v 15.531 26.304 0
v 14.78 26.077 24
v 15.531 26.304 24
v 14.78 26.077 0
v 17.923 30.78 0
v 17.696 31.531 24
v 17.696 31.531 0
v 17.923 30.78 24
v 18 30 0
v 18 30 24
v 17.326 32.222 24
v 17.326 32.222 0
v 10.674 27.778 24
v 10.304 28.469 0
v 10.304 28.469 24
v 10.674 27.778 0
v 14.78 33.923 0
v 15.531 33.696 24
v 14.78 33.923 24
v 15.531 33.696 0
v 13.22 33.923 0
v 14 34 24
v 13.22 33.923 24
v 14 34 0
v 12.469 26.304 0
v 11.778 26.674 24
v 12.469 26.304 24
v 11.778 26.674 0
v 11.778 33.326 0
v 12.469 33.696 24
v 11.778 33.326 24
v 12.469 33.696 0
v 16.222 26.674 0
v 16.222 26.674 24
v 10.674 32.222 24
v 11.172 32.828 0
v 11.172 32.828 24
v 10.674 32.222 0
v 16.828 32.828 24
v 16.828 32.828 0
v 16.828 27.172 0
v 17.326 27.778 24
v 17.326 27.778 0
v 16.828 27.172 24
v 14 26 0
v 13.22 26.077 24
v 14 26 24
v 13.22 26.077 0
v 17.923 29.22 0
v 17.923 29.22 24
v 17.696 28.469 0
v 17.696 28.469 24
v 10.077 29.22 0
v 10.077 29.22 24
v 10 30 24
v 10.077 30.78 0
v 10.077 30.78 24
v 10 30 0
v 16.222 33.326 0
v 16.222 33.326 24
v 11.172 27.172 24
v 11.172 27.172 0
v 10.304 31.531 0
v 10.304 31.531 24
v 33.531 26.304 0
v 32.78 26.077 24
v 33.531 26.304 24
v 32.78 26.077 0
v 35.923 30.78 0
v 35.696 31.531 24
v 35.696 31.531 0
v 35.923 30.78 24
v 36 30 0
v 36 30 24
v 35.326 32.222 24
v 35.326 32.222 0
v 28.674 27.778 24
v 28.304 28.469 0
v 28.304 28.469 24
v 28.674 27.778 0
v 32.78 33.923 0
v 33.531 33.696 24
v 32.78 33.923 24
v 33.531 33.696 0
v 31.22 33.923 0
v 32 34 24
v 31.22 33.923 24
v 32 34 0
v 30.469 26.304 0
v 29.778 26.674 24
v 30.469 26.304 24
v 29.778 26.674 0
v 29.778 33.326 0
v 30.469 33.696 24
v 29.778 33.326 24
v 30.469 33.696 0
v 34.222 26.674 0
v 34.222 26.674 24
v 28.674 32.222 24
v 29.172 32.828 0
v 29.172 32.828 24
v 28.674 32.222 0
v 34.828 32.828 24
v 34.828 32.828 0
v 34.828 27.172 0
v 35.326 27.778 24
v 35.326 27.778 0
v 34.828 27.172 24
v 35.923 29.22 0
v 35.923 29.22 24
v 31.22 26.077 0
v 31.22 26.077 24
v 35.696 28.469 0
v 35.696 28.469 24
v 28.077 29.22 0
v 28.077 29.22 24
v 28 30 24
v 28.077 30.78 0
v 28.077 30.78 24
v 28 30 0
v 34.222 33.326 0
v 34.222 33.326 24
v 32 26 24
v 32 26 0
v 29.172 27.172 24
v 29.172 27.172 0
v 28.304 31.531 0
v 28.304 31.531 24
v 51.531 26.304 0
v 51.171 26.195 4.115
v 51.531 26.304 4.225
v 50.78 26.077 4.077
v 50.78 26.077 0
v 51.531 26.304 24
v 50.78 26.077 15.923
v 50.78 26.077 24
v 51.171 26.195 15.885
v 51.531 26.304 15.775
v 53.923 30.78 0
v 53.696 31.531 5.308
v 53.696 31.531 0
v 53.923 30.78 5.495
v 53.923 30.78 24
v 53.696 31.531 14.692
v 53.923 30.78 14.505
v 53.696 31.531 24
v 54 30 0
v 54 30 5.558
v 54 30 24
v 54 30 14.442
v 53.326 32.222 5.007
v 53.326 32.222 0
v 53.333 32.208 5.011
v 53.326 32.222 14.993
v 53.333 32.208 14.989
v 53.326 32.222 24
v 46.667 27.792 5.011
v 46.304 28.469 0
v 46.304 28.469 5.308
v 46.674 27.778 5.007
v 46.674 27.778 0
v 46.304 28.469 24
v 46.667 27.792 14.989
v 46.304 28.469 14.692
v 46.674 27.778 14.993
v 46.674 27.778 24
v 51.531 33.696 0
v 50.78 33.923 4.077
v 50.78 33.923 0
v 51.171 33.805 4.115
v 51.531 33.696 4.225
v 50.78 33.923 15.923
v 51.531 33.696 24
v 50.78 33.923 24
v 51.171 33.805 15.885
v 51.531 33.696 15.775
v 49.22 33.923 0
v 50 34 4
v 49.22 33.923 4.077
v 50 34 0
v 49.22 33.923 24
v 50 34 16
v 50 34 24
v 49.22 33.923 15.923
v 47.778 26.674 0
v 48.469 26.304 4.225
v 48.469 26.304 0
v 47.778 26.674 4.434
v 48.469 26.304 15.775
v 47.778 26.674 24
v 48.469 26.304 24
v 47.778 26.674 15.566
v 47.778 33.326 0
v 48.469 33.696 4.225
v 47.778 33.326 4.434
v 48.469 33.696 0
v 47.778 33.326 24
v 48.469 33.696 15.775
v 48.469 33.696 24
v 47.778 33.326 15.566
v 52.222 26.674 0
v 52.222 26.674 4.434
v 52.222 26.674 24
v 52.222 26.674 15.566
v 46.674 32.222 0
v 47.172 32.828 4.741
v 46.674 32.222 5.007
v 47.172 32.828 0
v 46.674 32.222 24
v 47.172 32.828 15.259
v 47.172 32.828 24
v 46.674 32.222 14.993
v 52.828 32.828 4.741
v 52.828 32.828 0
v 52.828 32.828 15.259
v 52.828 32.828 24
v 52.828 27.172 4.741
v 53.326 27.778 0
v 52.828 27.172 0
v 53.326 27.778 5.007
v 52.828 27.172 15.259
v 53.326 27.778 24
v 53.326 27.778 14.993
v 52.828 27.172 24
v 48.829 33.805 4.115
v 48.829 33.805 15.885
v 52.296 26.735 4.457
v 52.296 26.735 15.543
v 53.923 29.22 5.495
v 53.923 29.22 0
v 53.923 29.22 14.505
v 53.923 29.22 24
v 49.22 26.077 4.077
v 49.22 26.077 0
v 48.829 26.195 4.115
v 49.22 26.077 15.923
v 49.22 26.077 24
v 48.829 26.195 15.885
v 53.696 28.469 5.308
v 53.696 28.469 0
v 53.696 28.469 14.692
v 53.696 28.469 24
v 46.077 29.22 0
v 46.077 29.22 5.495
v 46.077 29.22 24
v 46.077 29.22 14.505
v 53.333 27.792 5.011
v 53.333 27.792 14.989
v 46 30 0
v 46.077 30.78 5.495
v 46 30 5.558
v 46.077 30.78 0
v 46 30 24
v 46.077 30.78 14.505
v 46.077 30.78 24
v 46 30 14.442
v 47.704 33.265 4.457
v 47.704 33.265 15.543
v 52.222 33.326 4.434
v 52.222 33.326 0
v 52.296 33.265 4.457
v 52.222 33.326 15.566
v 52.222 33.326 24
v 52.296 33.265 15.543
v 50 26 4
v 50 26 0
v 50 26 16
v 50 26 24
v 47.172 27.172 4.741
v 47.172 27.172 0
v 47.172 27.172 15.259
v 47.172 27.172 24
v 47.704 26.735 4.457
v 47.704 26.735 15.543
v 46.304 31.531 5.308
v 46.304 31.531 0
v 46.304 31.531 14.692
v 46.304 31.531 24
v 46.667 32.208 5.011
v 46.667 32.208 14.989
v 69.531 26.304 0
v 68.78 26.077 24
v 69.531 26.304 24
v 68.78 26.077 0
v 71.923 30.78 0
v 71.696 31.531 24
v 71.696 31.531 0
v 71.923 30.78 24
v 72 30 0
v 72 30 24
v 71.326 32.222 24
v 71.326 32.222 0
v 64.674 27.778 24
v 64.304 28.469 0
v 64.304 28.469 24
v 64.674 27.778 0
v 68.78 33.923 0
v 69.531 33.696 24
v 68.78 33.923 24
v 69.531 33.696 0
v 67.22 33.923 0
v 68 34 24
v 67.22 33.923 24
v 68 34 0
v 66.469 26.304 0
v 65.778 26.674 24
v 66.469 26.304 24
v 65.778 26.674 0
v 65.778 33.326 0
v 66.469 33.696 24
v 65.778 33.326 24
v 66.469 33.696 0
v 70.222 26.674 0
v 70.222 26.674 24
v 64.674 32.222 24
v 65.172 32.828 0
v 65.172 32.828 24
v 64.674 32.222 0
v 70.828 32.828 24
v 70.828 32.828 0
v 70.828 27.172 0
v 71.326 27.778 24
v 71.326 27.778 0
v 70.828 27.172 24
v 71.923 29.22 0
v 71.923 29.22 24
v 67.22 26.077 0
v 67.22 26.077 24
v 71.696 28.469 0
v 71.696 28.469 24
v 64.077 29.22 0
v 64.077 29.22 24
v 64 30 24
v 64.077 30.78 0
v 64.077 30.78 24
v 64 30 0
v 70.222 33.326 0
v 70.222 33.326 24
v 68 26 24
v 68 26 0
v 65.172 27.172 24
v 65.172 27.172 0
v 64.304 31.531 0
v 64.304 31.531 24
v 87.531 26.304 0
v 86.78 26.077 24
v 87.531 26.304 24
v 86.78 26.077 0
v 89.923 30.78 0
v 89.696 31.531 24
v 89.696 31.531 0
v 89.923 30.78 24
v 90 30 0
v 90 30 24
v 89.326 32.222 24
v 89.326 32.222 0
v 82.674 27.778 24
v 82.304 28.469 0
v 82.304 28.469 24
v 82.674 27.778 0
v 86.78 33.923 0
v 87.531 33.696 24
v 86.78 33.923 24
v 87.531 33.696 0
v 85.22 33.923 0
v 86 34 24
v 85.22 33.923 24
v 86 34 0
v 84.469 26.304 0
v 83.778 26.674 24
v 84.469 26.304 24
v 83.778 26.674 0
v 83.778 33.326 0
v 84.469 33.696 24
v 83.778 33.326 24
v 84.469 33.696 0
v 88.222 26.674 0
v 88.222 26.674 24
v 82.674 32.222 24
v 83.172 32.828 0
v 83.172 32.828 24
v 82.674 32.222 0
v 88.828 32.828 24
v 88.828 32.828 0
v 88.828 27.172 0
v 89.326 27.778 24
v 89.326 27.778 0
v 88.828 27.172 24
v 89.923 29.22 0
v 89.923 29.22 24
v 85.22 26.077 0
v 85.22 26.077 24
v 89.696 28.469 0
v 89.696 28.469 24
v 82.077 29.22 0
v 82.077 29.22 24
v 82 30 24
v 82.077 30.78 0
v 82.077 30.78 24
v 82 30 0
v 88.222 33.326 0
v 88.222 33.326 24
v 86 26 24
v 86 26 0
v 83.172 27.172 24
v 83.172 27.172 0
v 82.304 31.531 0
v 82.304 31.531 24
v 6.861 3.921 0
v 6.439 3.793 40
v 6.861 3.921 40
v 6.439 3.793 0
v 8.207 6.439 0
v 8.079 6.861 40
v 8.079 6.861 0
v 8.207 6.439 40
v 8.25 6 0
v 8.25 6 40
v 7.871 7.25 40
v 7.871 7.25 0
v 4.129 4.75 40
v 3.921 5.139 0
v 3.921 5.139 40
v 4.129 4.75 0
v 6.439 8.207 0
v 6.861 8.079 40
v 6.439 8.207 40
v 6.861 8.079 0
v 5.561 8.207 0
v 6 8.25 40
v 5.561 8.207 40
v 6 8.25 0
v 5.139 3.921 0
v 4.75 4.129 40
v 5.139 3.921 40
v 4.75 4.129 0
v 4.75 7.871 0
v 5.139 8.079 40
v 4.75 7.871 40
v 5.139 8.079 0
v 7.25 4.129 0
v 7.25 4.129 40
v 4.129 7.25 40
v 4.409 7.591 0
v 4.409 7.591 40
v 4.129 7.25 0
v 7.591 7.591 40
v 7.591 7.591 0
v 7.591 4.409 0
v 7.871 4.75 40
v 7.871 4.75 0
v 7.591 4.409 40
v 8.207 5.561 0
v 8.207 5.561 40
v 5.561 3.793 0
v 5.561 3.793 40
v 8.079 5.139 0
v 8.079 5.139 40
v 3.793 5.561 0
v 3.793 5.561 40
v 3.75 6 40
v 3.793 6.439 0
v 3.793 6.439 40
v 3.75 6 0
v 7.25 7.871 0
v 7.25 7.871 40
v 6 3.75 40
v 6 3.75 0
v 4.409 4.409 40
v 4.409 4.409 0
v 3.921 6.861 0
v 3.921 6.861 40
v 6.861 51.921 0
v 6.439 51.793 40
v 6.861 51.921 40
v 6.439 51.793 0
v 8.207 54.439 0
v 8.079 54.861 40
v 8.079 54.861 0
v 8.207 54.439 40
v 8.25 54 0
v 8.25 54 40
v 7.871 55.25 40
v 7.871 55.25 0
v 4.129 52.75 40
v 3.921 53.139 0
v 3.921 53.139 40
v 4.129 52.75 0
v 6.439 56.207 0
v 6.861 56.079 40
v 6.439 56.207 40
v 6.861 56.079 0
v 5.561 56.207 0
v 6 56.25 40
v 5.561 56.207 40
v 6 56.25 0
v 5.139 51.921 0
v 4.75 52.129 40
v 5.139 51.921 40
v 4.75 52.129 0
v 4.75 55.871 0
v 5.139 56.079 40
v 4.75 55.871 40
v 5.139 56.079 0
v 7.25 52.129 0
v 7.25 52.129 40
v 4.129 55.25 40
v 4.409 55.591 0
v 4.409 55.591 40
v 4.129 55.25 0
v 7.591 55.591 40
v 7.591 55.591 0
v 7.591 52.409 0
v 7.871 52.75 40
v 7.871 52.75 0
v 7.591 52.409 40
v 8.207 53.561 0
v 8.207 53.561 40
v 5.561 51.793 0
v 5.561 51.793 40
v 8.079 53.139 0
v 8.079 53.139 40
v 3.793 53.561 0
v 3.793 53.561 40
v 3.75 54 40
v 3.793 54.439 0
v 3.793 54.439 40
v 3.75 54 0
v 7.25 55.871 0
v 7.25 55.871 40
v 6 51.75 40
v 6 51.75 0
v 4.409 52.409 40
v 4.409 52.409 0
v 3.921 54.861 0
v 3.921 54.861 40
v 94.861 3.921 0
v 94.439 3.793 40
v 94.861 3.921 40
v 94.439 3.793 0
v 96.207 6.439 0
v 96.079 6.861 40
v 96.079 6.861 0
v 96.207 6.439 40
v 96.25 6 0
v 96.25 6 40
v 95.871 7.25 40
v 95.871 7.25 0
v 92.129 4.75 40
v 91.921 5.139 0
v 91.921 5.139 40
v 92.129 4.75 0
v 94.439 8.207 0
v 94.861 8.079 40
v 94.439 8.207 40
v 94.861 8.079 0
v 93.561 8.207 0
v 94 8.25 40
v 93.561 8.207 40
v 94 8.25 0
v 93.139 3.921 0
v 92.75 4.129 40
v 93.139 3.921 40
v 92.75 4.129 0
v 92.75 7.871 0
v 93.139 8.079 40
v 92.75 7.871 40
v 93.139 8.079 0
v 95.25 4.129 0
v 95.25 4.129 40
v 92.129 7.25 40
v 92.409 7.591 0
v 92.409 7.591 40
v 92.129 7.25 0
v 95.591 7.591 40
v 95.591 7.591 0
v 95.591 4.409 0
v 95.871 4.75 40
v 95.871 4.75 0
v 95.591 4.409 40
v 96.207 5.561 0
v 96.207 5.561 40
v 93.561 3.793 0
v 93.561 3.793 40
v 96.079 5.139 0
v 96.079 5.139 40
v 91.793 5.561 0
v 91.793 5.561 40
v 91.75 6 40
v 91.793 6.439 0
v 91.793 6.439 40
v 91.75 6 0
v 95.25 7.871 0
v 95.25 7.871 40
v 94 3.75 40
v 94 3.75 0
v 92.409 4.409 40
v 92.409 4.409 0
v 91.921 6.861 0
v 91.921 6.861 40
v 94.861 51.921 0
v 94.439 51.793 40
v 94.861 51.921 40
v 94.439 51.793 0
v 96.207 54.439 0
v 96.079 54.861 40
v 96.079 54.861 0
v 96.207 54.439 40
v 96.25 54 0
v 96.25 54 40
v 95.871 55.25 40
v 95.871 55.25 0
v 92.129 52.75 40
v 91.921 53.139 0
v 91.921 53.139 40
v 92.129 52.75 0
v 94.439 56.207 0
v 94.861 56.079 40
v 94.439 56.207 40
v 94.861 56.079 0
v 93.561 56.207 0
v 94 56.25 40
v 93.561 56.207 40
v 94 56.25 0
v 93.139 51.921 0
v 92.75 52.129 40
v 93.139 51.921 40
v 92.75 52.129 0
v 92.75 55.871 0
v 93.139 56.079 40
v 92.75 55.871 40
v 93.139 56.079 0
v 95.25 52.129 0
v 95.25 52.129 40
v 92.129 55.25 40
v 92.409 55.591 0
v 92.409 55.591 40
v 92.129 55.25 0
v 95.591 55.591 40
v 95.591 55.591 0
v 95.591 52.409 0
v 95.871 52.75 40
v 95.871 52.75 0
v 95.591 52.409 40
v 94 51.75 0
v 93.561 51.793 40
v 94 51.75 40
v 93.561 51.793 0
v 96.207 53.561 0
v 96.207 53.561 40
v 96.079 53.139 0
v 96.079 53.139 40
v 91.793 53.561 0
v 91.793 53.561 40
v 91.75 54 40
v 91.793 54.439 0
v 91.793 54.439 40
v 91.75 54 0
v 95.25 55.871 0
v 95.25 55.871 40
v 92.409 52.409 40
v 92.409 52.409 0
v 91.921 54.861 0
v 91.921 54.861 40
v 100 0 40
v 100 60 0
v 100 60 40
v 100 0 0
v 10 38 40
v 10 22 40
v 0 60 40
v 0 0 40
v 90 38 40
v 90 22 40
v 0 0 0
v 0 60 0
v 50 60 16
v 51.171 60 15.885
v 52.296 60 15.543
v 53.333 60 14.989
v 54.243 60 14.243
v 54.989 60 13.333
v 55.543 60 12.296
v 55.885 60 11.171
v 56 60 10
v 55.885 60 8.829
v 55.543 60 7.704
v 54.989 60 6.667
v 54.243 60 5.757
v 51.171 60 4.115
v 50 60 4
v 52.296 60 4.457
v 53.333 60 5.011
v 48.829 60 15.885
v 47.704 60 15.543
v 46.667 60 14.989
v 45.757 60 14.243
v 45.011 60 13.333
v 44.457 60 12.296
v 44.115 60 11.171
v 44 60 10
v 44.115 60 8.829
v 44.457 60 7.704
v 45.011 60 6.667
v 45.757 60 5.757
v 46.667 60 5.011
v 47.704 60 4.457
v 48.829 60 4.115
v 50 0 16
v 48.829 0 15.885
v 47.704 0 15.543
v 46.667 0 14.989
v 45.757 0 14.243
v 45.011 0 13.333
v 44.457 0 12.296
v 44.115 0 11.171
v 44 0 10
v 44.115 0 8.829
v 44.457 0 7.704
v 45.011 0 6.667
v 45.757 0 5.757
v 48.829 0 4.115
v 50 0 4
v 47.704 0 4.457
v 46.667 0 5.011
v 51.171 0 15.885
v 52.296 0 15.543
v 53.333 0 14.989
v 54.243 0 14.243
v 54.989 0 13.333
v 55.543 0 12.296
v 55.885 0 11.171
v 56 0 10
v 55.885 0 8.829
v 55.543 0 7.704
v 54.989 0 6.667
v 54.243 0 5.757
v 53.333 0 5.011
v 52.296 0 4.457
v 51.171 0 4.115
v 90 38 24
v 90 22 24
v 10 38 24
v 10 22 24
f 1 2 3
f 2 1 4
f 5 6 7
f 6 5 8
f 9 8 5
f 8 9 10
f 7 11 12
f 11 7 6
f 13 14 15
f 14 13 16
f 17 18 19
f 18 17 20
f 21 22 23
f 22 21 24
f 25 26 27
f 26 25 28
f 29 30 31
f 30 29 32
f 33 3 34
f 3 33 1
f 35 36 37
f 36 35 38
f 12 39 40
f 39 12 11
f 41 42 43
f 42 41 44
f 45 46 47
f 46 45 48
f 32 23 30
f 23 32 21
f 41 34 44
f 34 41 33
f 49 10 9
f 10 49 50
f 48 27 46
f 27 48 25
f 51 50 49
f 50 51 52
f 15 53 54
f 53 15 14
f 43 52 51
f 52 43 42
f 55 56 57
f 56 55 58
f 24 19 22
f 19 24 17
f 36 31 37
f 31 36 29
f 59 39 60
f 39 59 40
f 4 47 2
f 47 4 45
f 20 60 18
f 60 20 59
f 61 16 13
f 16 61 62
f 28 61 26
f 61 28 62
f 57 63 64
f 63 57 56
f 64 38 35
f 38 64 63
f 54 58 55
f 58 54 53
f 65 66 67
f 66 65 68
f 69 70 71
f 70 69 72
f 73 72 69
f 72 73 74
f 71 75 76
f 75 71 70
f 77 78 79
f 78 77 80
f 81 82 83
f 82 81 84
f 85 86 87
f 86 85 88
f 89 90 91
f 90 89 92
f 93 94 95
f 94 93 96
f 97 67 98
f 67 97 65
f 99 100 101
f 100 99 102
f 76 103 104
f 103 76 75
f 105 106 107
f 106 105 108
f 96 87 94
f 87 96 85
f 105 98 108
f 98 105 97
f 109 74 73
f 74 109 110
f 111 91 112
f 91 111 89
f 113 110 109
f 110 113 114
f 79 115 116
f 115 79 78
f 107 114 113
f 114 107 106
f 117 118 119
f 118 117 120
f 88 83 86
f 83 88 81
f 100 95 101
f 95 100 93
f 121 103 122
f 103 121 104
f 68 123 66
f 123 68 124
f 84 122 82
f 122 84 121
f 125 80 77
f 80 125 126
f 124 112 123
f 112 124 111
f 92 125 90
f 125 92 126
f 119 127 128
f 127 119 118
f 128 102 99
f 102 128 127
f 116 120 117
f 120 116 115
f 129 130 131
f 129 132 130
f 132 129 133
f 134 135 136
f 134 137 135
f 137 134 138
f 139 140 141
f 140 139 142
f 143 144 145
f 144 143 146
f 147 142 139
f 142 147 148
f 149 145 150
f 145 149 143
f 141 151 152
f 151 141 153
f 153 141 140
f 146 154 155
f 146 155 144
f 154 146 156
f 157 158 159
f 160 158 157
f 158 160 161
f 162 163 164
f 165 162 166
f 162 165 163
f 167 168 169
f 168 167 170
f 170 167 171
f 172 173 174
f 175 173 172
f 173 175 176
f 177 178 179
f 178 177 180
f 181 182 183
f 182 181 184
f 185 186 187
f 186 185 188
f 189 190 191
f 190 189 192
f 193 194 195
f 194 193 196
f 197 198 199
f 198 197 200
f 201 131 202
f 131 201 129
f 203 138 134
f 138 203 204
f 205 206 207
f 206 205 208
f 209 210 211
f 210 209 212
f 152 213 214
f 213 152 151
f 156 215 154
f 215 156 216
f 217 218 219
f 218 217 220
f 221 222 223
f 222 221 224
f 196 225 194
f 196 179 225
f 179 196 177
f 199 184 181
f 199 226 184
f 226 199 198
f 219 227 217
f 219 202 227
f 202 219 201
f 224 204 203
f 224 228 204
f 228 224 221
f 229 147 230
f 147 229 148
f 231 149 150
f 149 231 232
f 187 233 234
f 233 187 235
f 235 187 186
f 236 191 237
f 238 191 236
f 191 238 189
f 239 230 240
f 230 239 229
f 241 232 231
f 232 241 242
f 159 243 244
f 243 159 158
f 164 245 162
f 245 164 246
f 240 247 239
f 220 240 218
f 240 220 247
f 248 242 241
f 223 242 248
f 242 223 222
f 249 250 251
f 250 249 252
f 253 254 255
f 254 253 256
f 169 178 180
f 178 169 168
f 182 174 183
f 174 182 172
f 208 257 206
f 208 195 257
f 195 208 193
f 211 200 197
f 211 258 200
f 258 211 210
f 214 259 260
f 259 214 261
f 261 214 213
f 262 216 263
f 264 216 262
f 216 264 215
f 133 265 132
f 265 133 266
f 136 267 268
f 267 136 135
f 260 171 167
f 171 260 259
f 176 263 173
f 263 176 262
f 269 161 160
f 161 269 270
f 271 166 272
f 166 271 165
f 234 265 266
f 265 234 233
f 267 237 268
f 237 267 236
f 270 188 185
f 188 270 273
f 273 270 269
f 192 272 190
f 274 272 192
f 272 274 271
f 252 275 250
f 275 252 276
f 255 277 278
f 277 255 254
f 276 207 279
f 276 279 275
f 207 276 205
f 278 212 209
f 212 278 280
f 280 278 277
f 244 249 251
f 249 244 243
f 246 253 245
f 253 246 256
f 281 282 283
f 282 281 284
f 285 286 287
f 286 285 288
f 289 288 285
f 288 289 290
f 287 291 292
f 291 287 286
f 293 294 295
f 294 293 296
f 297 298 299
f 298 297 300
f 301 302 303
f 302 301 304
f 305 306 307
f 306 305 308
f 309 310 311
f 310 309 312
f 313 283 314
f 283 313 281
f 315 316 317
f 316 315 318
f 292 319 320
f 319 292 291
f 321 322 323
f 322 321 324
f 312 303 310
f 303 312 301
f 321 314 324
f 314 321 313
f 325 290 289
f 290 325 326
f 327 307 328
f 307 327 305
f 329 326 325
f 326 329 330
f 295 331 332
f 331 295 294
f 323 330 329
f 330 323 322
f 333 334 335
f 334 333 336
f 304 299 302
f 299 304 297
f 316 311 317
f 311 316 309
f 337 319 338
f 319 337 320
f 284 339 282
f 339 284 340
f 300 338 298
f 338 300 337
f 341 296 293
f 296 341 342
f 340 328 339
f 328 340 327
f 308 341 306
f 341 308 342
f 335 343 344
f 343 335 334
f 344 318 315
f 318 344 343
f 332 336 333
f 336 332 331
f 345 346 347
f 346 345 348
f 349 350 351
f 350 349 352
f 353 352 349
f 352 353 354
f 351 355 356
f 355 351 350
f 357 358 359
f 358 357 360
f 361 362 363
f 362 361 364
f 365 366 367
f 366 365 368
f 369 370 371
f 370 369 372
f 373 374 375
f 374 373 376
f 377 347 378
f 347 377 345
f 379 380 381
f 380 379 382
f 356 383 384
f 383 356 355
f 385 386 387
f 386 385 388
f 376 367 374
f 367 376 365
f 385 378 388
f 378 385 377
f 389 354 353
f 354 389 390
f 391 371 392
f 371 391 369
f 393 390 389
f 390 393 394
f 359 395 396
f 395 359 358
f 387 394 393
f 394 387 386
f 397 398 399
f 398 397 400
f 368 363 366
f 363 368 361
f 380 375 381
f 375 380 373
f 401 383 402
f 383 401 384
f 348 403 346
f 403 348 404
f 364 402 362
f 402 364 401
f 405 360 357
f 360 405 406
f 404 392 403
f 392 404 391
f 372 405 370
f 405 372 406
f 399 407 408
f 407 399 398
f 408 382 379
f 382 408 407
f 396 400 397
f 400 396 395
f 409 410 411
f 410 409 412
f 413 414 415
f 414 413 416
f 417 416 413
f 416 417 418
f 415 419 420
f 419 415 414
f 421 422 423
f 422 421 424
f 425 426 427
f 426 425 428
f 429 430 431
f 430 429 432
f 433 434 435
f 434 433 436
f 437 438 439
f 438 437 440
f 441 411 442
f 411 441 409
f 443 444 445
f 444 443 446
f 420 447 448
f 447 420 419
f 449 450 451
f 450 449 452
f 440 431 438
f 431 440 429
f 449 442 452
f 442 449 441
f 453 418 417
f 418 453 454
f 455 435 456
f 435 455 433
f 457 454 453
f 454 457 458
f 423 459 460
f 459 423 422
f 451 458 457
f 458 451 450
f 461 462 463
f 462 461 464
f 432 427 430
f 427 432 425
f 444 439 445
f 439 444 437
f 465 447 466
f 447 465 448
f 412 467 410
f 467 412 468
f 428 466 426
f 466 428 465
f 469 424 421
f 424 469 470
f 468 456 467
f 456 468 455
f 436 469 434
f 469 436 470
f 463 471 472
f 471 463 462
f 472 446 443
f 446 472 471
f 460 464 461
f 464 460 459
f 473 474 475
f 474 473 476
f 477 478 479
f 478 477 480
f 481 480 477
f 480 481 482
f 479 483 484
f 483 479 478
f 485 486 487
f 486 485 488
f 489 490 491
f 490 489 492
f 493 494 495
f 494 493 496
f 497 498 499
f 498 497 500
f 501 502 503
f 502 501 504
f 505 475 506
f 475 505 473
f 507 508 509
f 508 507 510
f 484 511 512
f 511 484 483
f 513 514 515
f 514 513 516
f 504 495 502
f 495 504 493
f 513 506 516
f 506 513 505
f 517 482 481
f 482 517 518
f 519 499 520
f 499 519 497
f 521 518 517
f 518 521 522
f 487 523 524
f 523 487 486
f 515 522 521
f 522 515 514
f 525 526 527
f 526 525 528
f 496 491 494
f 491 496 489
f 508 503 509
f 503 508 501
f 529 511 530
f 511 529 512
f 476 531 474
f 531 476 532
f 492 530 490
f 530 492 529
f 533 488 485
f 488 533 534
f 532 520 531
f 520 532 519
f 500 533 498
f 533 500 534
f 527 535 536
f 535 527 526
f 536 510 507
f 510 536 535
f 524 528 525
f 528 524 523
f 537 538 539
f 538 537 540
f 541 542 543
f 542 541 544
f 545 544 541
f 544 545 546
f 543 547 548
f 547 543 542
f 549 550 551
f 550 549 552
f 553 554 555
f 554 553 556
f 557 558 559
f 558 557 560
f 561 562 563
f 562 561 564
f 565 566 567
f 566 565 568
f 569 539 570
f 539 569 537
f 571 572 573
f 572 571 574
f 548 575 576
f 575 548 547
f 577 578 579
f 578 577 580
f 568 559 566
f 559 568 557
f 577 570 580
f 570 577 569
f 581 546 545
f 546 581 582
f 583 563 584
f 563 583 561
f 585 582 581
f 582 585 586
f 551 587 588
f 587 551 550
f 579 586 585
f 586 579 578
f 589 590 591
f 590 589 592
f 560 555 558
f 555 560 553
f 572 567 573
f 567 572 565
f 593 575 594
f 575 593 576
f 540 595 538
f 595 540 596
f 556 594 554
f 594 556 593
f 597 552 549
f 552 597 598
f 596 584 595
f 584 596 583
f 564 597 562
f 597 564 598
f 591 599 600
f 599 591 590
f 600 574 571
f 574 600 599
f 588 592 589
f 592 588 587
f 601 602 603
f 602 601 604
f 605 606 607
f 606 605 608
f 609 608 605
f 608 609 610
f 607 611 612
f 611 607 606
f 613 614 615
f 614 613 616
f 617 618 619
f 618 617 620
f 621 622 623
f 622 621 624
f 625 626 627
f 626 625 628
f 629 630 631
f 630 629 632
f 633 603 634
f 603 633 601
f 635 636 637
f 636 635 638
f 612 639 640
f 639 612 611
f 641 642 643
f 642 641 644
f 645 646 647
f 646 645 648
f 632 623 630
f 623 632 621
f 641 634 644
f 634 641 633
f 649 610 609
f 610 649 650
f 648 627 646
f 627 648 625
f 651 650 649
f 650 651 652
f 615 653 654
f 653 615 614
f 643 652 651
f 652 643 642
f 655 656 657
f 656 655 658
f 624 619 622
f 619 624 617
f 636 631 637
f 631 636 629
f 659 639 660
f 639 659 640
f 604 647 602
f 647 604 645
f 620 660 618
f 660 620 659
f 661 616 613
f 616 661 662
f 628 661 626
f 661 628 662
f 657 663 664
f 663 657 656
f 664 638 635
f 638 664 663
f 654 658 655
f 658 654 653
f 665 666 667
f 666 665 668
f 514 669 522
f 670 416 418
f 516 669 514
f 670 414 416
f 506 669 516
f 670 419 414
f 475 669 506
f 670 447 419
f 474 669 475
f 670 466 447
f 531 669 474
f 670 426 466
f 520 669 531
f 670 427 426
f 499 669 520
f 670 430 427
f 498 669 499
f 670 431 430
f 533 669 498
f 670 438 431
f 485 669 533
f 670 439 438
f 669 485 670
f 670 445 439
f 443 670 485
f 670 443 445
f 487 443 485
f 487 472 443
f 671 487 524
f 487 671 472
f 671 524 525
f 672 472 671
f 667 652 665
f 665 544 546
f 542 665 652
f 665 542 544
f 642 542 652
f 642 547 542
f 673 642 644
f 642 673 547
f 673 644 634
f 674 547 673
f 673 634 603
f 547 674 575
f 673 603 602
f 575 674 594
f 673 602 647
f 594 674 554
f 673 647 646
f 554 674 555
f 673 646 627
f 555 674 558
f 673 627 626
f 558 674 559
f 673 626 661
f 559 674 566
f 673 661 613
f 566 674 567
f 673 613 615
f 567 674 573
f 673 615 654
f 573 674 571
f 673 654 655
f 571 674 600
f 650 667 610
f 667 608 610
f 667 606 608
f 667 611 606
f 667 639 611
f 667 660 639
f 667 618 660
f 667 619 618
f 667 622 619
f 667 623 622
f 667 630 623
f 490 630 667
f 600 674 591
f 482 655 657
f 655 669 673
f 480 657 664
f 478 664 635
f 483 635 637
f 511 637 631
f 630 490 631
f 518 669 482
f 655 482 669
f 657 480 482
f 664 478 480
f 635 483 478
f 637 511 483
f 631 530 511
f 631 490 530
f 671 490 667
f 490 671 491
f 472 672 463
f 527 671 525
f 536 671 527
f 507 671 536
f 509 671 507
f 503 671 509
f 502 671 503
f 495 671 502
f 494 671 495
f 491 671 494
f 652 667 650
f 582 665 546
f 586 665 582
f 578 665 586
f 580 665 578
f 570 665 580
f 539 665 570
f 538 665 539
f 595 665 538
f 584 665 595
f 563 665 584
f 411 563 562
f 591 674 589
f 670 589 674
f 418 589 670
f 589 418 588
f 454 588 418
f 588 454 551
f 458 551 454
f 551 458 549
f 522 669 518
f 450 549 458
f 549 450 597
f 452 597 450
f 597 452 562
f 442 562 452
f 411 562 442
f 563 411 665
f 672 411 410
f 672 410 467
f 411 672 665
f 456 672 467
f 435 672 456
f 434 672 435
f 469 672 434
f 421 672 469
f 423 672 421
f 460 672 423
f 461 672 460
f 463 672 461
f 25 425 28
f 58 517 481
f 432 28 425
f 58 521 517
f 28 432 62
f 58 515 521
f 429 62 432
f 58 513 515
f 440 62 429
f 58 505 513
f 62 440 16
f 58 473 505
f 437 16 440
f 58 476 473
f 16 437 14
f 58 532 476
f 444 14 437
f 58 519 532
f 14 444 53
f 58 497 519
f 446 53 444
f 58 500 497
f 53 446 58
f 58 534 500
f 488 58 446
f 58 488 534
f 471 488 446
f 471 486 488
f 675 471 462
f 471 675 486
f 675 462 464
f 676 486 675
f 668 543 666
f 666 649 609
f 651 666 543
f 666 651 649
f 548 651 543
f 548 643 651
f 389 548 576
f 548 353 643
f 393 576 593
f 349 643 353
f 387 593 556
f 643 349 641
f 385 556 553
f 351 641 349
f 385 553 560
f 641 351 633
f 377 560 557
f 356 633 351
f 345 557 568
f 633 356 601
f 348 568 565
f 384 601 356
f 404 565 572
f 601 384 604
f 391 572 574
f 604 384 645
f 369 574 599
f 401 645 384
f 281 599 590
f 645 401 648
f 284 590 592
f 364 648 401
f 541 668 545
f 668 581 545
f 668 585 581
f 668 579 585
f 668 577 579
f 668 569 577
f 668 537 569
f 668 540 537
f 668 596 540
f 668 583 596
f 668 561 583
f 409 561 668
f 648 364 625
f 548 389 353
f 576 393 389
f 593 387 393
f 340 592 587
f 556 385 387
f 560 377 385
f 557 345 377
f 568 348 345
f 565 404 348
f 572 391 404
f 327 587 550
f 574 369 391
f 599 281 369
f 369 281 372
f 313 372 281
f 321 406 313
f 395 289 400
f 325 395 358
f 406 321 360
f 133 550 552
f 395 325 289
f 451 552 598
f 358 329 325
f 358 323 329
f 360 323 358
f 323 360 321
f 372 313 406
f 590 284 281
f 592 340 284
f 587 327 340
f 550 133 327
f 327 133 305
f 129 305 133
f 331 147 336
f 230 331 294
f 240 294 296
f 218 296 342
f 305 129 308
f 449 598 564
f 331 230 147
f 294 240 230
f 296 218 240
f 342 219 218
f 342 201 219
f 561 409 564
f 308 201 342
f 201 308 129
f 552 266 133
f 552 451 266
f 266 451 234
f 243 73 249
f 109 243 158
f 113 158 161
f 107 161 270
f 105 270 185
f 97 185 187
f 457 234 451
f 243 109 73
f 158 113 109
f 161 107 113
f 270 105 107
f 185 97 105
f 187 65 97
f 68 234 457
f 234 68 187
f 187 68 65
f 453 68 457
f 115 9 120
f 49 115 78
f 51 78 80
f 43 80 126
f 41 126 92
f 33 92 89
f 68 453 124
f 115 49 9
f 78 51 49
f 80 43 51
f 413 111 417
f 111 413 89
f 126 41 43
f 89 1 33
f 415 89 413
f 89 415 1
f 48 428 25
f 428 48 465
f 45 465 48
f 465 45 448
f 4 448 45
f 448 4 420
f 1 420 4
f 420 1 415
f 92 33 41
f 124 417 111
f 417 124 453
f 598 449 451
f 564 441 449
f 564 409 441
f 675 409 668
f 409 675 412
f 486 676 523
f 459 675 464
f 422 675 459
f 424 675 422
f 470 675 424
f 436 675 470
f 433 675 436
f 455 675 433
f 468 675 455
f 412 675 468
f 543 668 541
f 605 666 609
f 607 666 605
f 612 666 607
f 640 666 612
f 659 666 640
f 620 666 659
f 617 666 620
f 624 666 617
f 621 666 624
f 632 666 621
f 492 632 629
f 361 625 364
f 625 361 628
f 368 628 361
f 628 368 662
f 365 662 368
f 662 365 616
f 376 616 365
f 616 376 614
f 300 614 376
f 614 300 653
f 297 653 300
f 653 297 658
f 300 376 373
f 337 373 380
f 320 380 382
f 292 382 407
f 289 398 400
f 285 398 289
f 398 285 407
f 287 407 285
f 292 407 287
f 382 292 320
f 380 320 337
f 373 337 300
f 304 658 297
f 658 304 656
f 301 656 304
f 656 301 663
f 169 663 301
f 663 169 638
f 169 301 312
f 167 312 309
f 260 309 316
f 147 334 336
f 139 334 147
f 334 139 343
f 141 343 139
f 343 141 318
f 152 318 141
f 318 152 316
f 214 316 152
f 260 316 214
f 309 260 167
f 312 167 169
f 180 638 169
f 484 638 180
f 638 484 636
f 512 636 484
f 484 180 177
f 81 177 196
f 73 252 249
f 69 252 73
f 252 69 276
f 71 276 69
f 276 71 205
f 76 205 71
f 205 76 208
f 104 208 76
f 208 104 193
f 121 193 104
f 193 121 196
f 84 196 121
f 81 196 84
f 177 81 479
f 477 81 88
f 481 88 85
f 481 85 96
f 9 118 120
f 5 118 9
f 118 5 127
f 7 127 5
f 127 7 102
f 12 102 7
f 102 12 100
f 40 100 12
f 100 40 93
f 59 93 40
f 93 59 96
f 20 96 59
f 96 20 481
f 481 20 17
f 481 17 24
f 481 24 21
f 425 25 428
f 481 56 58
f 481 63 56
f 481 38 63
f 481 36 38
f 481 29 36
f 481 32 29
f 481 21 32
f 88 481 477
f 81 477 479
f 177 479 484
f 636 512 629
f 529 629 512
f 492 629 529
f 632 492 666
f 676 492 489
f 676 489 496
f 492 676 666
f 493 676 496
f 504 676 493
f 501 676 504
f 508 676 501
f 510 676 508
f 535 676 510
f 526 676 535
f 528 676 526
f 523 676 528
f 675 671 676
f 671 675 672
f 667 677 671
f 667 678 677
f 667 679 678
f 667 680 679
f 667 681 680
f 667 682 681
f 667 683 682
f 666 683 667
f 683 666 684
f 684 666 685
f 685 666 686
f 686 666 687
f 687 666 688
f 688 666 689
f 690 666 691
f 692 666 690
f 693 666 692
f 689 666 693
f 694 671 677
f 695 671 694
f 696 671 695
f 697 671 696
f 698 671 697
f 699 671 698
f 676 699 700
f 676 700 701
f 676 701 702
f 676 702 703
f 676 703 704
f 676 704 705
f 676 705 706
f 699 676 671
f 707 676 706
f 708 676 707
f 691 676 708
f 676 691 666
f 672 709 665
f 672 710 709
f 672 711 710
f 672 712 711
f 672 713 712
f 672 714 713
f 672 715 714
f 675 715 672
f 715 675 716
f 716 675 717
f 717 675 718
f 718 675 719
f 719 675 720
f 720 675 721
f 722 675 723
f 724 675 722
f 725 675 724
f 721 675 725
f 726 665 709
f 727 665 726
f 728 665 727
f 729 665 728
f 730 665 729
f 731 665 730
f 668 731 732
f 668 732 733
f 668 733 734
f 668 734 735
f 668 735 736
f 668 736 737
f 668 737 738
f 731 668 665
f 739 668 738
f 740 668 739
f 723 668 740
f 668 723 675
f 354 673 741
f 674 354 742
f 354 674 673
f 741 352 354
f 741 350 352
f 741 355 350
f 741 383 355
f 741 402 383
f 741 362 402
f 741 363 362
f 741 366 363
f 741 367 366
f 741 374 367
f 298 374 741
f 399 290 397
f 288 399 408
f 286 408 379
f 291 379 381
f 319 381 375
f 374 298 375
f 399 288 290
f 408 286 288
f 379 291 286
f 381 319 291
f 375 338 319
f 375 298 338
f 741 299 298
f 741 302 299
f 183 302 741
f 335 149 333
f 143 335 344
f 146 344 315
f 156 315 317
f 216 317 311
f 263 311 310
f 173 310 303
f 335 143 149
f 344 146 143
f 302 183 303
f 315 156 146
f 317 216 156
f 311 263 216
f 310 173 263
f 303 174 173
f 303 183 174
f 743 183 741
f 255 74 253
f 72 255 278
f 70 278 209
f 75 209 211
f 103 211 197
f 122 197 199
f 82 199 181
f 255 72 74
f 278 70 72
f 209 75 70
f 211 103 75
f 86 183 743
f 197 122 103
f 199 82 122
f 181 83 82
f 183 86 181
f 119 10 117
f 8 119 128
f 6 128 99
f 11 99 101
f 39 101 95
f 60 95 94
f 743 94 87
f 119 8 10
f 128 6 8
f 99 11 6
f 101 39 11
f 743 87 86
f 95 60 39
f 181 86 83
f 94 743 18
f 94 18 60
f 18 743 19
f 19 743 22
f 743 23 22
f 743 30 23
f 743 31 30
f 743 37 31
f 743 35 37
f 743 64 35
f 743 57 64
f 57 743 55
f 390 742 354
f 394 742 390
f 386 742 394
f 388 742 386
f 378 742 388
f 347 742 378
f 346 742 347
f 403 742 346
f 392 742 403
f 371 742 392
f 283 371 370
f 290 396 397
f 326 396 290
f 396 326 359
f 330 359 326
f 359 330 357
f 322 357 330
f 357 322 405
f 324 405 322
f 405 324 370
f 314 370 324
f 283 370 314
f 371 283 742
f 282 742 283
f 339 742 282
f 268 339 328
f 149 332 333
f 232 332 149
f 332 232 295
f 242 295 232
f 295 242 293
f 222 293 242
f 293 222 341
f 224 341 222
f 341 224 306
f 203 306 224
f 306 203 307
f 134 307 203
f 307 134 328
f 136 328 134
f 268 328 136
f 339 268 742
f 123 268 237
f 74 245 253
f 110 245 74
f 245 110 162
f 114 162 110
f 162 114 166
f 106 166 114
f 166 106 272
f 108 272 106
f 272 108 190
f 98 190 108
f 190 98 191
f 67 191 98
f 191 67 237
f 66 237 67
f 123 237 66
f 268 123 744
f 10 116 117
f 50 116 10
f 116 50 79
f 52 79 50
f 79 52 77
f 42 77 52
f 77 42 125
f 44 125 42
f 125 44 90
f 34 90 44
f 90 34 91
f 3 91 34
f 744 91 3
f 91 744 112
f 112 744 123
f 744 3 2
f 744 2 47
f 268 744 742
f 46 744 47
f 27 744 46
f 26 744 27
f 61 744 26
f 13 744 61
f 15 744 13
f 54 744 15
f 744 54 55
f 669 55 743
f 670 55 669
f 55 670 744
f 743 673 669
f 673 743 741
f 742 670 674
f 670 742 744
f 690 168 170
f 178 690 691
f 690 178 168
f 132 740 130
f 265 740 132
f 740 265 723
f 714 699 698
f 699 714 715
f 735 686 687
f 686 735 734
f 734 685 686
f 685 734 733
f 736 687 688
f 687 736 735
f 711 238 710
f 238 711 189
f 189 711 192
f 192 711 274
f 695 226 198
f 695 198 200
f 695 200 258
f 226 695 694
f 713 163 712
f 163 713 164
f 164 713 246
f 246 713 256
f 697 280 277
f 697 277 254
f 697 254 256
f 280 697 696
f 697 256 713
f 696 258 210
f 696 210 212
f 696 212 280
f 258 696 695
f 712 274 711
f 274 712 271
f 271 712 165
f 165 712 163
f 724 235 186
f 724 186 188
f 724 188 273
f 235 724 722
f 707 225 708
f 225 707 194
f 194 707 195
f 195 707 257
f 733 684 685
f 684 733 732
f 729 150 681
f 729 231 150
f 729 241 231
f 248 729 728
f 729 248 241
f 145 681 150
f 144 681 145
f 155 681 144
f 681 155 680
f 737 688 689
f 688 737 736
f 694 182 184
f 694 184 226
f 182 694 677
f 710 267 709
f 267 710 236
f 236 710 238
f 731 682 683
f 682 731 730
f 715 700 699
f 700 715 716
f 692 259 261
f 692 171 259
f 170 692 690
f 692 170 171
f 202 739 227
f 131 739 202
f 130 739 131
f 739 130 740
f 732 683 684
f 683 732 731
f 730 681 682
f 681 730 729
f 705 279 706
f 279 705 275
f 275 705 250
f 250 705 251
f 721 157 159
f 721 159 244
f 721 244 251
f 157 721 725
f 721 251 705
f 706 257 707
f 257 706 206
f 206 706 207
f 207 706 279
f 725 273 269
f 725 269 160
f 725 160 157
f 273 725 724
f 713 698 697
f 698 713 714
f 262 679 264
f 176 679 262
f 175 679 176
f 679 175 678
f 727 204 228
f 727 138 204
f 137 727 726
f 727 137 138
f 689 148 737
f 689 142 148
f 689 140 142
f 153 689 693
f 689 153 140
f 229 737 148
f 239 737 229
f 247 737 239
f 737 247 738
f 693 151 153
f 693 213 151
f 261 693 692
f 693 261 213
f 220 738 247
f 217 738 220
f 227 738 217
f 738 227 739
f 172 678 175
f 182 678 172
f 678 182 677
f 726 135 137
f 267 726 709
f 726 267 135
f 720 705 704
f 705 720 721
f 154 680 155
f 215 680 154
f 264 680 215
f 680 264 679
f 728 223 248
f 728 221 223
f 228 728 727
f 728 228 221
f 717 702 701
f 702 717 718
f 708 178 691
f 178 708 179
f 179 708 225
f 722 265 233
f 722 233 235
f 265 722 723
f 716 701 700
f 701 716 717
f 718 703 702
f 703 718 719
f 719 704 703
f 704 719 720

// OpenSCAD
$fn = 32;

// ----------------------------------------------------------------------
// Manifold block: side_outlet manifold
// ----------------------------------------------------------------------

// --- parameters (mm) ---
block_l = 100;            // block length, X
block_w = 60;             // block width, Y
block_h = 40;             // block height, Z
port_d = 8;               // port bore diameter
port_pitch = 18;          // port pitch along X
gallery_d = 16;           // top gallery width, Y
gallery_depth = 16;       // gallery pocket depth
wall_p = 10;              // gallery end wall thickness, X
mnt_d = 4.5;              // mounting hole diameter
mnt_in = 6;               // mounting hole inset from the edges
out_d = 12;               // outlet bore diameter
out_z = 10;               // outlet axis height

n_ports = 5;  // ports in the row
port_x0 = (block_l - (n_ports - 1) * port_pitch) / 2;  // first port X

difference() {
  cube([block_l, block_w, block_h]);
  for (i = [0 : n_ports - 1])
    translate([port_x0 + i * port_pitch, block_w / 2, -1])
      cylinder(h = block_h + 2, d = port_d);
  translate([wall_p, block_w / 2 - gallery_d / 2, block_h - gallery_depth])
    cube([block_l - 2 * wall_p, gallery_d, gallery_depth + 1]);
  for (cx = [mnt_in, block_l - mnt_in])
    for (cy = [mnt_in, block_w - mnt_in])
      translate([cx, cy, -1]) cylinder(h = block_h + 2, d = mnt_d);
  translate([block_l / 2, -1, out_z]) rotate([-90, 0, 0])
    cylinder(h = block_w + 2, d = out_d);
}
